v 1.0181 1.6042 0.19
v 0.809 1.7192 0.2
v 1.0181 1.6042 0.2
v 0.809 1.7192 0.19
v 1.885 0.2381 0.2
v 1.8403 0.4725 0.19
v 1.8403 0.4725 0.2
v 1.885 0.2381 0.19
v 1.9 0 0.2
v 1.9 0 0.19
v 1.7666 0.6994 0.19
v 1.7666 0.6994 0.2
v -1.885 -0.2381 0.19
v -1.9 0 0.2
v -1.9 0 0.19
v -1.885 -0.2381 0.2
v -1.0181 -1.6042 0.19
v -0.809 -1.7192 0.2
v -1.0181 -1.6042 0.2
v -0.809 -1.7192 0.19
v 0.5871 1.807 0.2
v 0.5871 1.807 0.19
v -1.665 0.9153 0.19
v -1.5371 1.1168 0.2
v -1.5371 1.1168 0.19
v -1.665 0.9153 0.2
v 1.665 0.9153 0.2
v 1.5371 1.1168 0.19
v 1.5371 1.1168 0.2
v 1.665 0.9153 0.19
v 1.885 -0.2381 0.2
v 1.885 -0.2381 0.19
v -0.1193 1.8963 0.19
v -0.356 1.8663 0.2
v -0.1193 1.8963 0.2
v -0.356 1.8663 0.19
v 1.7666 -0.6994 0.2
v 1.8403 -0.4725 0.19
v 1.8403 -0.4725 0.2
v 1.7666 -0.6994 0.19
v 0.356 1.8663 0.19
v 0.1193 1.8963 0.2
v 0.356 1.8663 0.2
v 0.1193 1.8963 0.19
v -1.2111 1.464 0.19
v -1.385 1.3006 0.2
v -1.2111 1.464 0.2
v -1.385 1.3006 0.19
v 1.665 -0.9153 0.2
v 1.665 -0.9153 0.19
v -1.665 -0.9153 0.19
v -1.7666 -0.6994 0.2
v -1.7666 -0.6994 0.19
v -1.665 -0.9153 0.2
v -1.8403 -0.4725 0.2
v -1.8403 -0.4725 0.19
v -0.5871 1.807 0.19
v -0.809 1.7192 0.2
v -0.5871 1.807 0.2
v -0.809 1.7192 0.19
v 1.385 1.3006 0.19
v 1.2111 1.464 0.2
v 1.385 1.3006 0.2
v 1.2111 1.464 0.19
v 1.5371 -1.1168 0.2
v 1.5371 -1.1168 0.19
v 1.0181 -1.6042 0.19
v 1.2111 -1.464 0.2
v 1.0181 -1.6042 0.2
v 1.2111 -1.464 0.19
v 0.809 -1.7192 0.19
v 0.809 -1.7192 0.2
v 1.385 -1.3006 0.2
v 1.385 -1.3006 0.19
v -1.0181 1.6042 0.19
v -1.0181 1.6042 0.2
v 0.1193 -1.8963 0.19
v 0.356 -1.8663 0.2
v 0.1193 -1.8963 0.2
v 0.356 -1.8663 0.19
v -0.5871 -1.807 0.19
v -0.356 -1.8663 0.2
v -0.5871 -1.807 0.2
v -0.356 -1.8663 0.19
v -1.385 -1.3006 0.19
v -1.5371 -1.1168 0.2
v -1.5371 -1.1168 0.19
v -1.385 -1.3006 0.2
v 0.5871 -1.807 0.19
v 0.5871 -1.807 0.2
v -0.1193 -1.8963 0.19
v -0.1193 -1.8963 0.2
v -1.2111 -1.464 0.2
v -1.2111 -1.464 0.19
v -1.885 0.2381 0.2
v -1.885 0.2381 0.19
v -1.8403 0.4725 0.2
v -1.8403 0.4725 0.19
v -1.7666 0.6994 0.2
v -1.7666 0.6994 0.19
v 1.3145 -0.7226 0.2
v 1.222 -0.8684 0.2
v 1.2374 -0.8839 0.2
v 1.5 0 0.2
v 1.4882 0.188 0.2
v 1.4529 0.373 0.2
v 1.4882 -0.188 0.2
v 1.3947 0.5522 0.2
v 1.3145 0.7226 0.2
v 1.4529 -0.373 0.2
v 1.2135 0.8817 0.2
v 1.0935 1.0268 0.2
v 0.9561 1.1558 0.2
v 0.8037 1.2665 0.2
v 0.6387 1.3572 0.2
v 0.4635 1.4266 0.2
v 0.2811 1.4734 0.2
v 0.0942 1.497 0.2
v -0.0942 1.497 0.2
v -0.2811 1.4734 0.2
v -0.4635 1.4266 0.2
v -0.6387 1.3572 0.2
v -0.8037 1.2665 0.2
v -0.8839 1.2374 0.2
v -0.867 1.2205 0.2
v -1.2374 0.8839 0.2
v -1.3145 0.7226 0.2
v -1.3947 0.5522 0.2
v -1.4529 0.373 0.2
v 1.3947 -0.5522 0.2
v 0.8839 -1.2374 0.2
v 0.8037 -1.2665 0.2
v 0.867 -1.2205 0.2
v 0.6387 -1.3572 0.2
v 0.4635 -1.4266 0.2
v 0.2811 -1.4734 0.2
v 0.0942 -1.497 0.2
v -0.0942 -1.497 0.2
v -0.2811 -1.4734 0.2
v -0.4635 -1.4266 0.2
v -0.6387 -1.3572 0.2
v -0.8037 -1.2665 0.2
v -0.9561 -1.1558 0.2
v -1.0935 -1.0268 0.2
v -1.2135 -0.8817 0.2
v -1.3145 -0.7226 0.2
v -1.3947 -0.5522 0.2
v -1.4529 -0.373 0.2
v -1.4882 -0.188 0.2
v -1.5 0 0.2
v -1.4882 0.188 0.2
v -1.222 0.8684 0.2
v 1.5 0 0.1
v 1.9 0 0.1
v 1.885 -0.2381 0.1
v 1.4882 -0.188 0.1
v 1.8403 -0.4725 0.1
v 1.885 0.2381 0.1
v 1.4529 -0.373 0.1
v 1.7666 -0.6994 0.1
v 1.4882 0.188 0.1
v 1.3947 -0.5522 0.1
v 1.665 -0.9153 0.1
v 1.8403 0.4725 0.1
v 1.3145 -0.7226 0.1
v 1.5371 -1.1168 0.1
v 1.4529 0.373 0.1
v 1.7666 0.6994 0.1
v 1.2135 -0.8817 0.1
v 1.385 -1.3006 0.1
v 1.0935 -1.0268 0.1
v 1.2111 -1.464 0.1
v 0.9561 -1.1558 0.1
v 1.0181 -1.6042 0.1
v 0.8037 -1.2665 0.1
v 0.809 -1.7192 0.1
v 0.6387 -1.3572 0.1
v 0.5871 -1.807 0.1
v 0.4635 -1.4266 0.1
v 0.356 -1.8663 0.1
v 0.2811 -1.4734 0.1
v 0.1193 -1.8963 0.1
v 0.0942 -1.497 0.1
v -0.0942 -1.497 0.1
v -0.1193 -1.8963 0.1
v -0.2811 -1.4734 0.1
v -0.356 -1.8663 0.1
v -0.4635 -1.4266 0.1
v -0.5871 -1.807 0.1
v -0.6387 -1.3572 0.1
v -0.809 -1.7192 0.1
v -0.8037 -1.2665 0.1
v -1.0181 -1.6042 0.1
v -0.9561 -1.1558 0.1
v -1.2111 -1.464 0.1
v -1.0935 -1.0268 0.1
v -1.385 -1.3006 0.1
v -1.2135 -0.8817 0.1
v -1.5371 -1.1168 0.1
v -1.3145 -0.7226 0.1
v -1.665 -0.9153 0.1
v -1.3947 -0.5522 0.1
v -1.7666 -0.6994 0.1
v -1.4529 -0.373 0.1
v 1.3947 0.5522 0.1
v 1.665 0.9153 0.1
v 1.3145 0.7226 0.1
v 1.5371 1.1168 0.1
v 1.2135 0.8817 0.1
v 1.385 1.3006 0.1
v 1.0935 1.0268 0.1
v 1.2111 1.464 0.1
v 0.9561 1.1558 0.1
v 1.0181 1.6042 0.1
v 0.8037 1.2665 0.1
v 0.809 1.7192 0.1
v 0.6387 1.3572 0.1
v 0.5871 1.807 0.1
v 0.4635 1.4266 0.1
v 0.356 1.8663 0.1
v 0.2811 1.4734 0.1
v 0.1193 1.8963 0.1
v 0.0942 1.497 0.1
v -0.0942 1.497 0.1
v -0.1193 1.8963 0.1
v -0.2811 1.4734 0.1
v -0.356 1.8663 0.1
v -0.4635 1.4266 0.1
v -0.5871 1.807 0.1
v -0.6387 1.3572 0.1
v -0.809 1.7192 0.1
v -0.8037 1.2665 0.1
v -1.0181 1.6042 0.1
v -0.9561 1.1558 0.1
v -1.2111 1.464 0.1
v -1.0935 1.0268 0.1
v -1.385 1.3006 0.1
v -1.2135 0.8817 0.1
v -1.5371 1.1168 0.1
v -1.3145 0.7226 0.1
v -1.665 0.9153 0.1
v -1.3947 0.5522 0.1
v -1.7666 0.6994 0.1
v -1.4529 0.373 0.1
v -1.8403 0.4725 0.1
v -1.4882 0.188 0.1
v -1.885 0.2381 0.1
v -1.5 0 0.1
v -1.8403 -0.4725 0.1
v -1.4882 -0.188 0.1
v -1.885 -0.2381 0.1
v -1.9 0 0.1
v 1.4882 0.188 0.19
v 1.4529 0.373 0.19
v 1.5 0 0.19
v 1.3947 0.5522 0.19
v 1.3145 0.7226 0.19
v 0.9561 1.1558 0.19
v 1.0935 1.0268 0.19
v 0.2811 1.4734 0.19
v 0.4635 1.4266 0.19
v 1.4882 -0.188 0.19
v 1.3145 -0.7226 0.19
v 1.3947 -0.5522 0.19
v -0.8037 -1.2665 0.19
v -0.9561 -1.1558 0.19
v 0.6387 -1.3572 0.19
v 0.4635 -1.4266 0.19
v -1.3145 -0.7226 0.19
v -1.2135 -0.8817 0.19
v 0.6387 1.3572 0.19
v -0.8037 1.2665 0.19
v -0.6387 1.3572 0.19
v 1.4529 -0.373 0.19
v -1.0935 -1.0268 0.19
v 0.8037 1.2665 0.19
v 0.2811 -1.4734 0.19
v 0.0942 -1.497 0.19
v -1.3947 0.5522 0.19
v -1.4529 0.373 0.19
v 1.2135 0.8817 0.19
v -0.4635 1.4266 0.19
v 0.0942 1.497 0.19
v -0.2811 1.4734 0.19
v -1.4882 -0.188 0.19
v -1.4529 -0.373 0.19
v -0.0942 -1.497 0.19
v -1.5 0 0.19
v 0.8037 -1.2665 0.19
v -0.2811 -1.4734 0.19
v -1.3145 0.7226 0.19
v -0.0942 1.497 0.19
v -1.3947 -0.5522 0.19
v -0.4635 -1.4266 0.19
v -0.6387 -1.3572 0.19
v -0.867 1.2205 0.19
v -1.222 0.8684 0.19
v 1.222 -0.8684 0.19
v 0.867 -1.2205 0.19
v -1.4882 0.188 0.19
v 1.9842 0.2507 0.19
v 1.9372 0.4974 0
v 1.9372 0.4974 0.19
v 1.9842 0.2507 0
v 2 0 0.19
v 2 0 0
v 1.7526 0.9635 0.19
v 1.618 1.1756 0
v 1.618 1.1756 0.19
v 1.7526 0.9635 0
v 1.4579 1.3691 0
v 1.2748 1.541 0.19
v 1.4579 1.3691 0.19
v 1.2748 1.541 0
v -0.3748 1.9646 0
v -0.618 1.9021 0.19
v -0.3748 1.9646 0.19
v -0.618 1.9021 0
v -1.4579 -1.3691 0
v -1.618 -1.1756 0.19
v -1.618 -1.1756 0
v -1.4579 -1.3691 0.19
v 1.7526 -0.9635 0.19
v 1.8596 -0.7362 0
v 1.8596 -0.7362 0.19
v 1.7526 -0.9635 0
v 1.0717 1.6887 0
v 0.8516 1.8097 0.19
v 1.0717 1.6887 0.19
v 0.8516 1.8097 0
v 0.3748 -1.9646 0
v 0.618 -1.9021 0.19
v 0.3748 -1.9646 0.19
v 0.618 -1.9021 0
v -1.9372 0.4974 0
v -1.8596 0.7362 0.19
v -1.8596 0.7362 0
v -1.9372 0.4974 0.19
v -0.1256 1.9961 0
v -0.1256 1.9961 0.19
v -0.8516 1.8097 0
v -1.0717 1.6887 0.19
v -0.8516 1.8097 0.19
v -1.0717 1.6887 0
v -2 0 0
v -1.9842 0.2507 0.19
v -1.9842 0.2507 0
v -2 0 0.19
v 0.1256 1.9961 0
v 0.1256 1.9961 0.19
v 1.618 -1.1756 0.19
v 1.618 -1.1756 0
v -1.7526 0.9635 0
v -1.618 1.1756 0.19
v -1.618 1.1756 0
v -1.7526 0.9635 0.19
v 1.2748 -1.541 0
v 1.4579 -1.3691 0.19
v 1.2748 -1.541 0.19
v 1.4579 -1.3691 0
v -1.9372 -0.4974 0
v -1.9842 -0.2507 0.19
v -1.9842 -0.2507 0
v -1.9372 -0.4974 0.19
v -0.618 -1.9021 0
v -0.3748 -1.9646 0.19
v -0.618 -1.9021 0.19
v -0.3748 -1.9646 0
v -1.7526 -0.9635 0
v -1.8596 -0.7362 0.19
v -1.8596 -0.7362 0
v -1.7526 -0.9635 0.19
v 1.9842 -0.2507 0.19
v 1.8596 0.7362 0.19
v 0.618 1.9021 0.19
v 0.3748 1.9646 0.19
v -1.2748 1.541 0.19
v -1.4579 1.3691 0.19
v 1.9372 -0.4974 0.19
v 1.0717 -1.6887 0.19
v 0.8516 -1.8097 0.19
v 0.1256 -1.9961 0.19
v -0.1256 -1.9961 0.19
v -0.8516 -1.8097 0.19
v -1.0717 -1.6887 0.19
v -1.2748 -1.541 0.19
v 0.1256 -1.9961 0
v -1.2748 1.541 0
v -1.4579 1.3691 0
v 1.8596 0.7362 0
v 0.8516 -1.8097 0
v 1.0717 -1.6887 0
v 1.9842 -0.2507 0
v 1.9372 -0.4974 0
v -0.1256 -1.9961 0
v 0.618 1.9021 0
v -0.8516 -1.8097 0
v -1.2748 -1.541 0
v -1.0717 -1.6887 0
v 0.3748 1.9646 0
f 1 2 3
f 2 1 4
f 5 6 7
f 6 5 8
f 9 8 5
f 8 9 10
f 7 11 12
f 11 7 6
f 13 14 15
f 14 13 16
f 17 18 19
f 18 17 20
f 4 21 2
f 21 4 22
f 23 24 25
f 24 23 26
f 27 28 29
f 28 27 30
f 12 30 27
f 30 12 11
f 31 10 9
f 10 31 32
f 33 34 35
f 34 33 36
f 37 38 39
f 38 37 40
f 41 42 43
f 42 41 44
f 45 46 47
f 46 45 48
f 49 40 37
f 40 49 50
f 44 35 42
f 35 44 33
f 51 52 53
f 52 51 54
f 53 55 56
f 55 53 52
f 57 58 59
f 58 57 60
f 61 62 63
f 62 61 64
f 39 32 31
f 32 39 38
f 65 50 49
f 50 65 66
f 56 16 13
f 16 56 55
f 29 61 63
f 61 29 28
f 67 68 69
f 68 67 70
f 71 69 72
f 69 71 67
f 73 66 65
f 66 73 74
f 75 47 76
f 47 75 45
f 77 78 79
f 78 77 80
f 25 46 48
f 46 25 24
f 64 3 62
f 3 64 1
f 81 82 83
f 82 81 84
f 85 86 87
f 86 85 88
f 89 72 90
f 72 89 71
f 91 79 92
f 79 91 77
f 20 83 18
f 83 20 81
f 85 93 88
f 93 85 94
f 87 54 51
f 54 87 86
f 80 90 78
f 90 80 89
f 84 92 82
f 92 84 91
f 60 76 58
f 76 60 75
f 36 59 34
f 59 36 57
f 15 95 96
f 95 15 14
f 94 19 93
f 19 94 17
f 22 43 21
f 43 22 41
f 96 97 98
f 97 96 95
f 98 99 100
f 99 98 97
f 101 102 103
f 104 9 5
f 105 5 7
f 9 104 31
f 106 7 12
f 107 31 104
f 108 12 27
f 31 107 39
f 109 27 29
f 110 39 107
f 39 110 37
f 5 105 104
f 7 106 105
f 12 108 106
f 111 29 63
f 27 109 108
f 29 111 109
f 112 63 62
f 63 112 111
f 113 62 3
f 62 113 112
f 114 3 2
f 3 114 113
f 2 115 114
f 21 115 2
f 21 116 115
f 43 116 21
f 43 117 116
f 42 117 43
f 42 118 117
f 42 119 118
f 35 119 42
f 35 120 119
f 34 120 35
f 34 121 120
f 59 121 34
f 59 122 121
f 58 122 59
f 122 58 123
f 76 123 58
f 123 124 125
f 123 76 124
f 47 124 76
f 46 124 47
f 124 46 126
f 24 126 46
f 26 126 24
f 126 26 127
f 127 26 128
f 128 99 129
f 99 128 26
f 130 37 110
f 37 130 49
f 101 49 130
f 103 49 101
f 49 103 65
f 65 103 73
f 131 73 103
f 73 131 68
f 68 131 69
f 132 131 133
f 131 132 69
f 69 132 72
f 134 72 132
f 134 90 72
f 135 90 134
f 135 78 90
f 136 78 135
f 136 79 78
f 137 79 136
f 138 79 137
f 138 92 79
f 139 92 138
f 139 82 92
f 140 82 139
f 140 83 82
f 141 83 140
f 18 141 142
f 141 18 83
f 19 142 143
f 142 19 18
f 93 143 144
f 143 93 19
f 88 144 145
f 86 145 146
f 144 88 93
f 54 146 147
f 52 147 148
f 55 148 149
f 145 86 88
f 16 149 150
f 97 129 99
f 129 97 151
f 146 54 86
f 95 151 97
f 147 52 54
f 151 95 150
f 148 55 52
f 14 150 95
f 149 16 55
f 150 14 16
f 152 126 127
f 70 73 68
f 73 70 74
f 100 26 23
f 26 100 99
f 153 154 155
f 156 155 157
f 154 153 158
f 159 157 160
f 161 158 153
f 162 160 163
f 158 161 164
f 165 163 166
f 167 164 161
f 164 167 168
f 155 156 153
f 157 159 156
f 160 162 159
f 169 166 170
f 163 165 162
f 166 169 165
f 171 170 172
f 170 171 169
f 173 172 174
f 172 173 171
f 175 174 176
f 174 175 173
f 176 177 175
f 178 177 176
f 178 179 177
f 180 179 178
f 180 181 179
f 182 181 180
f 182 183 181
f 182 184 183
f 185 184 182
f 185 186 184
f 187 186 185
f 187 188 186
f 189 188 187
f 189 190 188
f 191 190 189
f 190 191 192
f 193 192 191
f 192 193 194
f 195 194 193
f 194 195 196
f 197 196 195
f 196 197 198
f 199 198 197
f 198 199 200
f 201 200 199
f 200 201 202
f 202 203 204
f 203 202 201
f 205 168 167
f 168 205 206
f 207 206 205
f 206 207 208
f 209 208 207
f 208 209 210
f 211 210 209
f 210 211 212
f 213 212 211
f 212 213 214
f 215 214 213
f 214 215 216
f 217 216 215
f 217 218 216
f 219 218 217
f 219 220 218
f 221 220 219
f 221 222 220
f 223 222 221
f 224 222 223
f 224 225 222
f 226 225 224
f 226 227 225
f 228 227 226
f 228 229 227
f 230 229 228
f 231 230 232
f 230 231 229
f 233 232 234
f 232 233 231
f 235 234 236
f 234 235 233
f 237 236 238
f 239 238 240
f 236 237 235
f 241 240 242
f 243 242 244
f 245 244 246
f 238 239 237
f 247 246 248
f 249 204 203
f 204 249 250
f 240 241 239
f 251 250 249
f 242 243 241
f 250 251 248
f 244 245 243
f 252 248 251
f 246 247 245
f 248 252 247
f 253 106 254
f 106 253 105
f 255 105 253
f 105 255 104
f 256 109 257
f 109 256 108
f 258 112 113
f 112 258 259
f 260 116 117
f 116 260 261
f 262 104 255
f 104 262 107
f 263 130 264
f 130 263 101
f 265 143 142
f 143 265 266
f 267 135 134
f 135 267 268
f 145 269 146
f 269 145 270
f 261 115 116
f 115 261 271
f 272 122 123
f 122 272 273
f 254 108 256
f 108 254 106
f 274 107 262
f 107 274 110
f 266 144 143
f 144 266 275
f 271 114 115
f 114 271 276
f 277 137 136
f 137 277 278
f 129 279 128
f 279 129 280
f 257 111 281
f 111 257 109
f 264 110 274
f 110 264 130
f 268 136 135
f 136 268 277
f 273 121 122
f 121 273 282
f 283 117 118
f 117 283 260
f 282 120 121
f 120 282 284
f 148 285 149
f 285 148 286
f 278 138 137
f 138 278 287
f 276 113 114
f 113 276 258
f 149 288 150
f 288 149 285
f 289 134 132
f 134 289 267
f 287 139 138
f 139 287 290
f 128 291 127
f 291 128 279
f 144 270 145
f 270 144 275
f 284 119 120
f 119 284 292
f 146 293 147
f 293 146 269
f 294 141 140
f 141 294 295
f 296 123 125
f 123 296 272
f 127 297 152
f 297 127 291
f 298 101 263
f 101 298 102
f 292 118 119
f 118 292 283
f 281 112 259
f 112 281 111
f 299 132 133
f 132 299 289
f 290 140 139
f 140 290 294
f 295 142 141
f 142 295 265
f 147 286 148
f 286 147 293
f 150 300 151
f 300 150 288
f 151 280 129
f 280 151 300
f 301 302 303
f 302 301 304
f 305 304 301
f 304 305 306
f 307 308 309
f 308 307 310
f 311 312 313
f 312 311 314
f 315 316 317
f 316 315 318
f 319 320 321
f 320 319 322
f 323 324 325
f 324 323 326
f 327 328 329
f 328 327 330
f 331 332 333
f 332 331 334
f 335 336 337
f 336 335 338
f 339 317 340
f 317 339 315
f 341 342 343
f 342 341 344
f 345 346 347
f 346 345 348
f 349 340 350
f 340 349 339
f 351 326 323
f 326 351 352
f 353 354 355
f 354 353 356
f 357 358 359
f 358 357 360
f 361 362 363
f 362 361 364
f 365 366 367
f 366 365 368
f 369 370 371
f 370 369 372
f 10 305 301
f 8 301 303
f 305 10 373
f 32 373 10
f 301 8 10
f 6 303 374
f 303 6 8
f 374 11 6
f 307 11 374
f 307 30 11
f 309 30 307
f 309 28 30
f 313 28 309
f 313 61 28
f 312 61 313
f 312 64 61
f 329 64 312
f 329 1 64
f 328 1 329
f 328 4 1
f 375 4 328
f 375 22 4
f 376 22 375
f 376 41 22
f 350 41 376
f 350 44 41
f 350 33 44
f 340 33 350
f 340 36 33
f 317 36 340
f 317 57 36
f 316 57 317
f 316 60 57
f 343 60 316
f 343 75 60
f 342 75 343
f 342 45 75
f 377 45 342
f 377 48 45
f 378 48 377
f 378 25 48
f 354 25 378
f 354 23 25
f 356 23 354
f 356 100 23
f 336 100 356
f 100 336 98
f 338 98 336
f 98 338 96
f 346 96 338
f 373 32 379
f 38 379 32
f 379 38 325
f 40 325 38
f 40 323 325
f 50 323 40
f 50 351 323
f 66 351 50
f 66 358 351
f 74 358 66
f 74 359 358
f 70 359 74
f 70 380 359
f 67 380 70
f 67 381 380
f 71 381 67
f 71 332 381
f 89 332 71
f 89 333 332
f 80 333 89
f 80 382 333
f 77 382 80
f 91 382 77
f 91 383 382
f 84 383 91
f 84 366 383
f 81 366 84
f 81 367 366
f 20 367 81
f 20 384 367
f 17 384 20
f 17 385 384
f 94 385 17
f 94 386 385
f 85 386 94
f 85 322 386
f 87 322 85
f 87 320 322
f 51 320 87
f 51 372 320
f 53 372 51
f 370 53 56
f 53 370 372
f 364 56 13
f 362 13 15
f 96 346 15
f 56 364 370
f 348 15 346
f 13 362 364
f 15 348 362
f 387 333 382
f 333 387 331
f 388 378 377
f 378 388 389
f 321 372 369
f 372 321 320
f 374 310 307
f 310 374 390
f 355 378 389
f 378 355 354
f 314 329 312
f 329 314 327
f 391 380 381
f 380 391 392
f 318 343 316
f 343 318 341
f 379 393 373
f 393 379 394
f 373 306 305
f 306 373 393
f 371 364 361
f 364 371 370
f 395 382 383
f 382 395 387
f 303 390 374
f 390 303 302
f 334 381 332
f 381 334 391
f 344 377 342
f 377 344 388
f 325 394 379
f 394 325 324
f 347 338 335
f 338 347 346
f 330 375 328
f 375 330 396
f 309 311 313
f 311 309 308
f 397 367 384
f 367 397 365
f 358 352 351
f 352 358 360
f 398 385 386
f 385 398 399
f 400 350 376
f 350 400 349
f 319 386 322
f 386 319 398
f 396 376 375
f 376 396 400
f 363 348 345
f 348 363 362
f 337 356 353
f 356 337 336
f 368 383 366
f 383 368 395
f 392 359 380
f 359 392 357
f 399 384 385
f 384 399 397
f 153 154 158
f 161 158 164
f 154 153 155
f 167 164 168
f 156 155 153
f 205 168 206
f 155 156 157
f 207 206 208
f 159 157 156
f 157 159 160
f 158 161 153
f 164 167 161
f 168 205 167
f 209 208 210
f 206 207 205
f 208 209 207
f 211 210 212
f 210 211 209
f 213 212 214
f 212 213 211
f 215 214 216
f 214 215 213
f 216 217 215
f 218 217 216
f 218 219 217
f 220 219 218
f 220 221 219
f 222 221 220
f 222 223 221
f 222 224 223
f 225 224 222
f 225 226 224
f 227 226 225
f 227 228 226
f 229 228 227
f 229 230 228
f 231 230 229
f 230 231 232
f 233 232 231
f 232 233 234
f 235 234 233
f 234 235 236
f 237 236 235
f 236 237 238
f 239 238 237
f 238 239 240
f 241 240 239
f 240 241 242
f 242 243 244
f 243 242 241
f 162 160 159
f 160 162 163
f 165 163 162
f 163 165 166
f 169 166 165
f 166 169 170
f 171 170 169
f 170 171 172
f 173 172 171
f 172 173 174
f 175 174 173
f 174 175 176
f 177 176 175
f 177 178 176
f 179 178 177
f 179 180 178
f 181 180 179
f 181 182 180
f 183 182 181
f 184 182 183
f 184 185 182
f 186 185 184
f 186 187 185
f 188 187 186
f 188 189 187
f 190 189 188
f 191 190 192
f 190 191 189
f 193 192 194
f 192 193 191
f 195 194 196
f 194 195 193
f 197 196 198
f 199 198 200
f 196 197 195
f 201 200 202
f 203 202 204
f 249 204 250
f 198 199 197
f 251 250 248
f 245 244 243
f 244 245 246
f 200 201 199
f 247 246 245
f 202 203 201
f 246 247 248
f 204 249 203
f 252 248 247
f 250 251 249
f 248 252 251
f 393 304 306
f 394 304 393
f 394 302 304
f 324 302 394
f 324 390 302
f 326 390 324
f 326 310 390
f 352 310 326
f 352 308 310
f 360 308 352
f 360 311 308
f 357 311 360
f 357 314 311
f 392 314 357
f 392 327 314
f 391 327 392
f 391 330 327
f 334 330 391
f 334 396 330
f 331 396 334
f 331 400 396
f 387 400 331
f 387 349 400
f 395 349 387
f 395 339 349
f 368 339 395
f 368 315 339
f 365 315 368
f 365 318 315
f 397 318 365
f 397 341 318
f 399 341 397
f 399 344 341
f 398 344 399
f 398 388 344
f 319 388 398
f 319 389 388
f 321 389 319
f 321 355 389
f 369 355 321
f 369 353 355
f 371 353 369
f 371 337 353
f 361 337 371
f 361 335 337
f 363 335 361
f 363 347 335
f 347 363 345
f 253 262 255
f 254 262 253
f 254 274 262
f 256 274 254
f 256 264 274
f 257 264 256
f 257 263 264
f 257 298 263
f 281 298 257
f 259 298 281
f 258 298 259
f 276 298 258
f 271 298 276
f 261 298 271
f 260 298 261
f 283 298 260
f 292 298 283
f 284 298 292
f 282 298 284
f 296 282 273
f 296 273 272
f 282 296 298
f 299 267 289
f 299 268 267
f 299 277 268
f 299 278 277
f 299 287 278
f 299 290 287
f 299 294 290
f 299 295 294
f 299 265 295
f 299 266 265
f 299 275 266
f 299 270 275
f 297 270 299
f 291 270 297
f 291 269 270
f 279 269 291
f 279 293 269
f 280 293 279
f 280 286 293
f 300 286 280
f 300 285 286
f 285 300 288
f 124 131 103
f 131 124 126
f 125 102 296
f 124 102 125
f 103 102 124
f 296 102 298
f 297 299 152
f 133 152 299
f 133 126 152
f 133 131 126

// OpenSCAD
Red_Size = 1.5;


color("gray")
cylinder(h = 0.1, r1 = 2,r2 = 2,$fn = 50);

translate([0,0,0.1])
difference(){
color("red")
cylinder(h = 0.1, r1 = 1.9,r2 = 1.9,$fn = 50);
cylinder(h = 0.2, r1 = 1.5,r2 = 1.5,$fn = 50);

}


translate([0,0,0.09])
difference(){
color("white")
cylinder(h = 0.1, r1 = 2,r2 = 2,$fn = 50);
cylinder(h = 0.2, r1 = 1.9,r2 = 1.9,$fn = 50);

}

color("white")
translate([0,0,0.09])
cylinder(h = 0.1, r1 = 1.5,r2 = 1.5,$fn = 50);


rotate([0,0,-45])
translate([0,0,0.09])
color("red")
translate([0,0,0.09])
cube([3,0.5,0.04], center = true);
